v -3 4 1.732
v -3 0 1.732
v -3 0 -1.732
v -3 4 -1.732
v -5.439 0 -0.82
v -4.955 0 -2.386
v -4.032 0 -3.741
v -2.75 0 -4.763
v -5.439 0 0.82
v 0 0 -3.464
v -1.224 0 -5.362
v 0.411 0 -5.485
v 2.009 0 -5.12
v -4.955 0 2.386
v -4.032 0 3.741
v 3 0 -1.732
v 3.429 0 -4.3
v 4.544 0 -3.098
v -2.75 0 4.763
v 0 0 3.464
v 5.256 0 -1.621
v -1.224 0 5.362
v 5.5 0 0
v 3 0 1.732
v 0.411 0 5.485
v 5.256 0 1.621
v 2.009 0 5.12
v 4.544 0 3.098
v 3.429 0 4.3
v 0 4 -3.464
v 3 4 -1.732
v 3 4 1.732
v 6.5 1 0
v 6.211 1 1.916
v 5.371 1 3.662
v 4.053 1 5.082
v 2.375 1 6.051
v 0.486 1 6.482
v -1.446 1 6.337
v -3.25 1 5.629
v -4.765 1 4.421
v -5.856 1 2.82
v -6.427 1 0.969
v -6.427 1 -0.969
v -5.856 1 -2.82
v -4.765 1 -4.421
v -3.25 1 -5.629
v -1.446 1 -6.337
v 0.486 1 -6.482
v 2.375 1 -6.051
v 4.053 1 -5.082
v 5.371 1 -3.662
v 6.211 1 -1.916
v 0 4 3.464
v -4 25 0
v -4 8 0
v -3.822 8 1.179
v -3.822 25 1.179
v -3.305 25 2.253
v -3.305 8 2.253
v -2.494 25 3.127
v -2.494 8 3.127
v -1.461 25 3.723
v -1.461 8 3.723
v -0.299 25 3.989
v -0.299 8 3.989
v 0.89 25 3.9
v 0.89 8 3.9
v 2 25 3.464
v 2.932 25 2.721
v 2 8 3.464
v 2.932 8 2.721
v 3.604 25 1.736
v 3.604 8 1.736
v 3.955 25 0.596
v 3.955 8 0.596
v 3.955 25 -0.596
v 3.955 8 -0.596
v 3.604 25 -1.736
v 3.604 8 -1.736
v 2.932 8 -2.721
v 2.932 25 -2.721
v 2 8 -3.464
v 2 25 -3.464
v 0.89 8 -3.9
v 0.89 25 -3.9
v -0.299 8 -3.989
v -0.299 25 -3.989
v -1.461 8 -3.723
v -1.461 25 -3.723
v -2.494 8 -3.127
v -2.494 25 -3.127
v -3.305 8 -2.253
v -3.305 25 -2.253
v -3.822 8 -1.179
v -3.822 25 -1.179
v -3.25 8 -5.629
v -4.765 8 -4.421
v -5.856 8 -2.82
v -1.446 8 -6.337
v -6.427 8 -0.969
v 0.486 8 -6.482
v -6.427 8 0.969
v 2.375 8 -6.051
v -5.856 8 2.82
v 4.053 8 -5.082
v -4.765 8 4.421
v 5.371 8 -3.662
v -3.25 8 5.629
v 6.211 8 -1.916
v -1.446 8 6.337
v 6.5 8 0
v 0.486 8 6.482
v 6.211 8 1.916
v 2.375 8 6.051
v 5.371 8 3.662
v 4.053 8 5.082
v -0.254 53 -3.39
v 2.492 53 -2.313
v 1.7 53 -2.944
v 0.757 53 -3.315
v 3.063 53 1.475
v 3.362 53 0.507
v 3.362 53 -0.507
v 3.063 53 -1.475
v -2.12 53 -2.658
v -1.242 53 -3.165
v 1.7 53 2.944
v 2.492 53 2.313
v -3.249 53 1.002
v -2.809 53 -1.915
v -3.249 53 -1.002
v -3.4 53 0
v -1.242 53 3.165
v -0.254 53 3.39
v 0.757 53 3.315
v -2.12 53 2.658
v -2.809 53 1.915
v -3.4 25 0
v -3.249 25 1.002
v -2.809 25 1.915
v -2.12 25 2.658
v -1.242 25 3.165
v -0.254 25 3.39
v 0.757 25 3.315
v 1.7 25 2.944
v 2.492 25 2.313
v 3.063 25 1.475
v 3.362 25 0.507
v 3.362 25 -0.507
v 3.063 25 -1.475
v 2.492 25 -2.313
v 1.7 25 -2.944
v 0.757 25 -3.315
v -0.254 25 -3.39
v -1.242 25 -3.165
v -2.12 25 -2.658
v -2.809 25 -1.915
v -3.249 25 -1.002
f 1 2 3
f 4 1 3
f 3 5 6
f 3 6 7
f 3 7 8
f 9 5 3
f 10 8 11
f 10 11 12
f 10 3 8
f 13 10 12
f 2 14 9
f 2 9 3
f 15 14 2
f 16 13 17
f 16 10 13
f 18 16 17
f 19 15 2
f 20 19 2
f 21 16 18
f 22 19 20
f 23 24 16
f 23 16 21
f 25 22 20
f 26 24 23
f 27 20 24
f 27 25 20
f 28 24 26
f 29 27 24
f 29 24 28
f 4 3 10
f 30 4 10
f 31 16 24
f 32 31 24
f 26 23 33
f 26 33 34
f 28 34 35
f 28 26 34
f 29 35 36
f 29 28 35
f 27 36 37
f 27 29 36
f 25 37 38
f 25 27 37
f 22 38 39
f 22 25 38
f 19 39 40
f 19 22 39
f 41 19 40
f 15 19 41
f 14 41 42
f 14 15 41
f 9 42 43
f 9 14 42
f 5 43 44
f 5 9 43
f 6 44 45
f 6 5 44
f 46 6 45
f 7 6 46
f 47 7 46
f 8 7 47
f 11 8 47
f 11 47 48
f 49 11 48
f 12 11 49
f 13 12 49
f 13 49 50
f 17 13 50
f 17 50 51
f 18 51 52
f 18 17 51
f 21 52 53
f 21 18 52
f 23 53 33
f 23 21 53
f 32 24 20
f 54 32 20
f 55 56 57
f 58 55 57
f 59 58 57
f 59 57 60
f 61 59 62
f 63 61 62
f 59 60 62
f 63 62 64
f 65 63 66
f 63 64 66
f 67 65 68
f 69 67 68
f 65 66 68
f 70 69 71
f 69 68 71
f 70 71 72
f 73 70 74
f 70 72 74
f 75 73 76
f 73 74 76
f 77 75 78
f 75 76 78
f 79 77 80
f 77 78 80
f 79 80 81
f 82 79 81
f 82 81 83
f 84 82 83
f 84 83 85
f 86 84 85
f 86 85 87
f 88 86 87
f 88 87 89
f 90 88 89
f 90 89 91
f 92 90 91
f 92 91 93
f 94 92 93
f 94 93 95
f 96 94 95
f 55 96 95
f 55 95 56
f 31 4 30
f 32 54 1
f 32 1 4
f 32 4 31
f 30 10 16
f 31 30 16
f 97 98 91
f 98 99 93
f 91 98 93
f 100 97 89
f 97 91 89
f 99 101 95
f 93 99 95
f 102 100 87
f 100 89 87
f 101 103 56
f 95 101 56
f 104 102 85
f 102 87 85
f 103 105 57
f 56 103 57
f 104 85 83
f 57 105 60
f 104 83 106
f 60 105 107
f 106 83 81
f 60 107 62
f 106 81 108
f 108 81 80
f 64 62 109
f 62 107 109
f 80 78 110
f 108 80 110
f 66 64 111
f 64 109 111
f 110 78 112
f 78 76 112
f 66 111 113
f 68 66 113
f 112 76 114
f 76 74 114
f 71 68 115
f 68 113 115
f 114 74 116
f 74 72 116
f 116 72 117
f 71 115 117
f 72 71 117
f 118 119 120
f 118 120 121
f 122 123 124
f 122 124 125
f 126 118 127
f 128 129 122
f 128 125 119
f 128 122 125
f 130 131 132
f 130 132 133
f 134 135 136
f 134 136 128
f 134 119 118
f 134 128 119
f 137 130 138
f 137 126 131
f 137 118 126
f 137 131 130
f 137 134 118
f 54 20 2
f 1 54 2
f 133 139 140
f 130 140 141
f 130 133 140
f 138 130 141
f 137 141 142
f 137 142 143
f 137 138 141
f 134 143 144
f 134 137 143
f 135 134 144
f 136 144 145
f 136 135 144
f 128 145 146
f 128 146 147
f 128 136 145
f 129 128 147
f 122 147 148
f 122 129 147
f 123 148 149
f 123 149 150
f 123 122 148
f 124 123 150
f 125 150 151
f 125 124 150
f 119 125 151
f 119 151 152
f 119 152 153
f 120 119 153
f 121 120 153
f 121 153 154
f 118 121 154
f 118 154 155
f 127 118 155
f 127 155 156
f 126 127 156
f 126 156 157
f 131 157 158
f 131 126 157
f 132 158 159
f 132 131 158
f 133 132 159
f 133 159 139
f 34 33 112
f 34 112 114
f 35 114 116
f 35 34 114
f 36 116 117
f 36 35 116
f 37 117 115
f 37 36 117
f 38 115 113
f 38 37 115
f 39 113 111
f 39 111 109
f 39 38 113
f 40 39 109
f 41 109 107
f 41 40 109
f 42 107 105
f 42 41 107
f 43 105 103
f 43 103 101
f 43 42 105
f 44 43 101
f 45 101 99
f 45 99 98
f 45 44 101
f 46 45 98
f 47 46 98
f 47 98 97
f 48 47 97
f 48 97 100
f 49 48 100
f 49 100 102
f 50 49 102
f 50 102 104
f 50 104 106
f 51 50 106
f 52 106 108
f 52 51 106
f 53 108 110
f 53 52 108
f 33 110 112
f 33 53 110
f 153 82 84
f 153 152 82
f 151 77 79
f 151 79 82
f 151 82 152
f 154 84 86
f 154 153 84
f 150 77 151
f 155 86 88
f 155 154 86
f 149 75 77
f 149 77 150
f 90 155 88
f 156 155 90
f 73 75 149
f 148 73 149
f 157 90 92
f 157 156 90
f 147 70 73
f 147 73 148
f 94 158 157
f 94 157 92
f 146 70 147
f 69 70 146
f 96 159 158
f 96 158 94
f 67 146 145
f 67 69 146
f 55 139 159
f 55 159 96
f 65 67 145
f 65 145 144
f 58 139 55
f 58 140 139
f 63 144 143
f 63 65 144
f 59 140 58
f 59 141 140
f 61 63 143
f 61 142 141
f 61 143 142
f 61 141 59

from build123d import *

# Parameters (mm, degrees)
F0_R     = 6.5
F1_DEPTH = 8
F3_DEPTH = 4
F4_R     = 4
F5_DEPTH = 45
F6_R     = 4
F6_R_2   = 3.4
F7_DEPTH = 28
F8_SIZE  = 1


with BuildPart() as f1:
    # F0 (on Front) → F1 (new body)
    with BuildSketch(Plane.XZ):
        Circle(F0_R)
    extrude(amount=-F1_DEPTH)

    # F2 (on face) → F3 (cut)
    with BuildSketch(Plane.XZ):
        Polygon((3, 1.732051), (0, 3.464102), (-3, 1.732051), (-3, -1.732051), (0, -3.464102), (3, -1.732051), align=None)
    extrude(amount=-F3_DEPTH, mode=Mode.SUBTRACT)

    # F4 (on face) → F5 (join)
    with BuildSketch(Plane(origin=(0, 8, 0), x_dir=(-1, 0, 0), z_dir=(0, 1, 0))):
        Circle(F4_R)
    extrude(amount=F5_DEPTH)

    # F6 (on face) → F7 (cut)
    with BuildSketch(Plane(origin=(0, 53, 0), x_dir=(-1, 0, 0), z_dir=(0, 1, 0))):
        Circle(F6_R)
        Circle(F6_R_2, mode=Mode.SUBTRACT)
    extrude(amount=-F7_DEPTH, mode=Mode.SUBTRACT)

    # F8
    f8_edges = [f1.edges().sort_by_distance(p)[0] for p in [
        (-6.5, 0, 0),
    ]]
    chamfer(f8_edges, length=F8_SIZE)


solid = f1.part
